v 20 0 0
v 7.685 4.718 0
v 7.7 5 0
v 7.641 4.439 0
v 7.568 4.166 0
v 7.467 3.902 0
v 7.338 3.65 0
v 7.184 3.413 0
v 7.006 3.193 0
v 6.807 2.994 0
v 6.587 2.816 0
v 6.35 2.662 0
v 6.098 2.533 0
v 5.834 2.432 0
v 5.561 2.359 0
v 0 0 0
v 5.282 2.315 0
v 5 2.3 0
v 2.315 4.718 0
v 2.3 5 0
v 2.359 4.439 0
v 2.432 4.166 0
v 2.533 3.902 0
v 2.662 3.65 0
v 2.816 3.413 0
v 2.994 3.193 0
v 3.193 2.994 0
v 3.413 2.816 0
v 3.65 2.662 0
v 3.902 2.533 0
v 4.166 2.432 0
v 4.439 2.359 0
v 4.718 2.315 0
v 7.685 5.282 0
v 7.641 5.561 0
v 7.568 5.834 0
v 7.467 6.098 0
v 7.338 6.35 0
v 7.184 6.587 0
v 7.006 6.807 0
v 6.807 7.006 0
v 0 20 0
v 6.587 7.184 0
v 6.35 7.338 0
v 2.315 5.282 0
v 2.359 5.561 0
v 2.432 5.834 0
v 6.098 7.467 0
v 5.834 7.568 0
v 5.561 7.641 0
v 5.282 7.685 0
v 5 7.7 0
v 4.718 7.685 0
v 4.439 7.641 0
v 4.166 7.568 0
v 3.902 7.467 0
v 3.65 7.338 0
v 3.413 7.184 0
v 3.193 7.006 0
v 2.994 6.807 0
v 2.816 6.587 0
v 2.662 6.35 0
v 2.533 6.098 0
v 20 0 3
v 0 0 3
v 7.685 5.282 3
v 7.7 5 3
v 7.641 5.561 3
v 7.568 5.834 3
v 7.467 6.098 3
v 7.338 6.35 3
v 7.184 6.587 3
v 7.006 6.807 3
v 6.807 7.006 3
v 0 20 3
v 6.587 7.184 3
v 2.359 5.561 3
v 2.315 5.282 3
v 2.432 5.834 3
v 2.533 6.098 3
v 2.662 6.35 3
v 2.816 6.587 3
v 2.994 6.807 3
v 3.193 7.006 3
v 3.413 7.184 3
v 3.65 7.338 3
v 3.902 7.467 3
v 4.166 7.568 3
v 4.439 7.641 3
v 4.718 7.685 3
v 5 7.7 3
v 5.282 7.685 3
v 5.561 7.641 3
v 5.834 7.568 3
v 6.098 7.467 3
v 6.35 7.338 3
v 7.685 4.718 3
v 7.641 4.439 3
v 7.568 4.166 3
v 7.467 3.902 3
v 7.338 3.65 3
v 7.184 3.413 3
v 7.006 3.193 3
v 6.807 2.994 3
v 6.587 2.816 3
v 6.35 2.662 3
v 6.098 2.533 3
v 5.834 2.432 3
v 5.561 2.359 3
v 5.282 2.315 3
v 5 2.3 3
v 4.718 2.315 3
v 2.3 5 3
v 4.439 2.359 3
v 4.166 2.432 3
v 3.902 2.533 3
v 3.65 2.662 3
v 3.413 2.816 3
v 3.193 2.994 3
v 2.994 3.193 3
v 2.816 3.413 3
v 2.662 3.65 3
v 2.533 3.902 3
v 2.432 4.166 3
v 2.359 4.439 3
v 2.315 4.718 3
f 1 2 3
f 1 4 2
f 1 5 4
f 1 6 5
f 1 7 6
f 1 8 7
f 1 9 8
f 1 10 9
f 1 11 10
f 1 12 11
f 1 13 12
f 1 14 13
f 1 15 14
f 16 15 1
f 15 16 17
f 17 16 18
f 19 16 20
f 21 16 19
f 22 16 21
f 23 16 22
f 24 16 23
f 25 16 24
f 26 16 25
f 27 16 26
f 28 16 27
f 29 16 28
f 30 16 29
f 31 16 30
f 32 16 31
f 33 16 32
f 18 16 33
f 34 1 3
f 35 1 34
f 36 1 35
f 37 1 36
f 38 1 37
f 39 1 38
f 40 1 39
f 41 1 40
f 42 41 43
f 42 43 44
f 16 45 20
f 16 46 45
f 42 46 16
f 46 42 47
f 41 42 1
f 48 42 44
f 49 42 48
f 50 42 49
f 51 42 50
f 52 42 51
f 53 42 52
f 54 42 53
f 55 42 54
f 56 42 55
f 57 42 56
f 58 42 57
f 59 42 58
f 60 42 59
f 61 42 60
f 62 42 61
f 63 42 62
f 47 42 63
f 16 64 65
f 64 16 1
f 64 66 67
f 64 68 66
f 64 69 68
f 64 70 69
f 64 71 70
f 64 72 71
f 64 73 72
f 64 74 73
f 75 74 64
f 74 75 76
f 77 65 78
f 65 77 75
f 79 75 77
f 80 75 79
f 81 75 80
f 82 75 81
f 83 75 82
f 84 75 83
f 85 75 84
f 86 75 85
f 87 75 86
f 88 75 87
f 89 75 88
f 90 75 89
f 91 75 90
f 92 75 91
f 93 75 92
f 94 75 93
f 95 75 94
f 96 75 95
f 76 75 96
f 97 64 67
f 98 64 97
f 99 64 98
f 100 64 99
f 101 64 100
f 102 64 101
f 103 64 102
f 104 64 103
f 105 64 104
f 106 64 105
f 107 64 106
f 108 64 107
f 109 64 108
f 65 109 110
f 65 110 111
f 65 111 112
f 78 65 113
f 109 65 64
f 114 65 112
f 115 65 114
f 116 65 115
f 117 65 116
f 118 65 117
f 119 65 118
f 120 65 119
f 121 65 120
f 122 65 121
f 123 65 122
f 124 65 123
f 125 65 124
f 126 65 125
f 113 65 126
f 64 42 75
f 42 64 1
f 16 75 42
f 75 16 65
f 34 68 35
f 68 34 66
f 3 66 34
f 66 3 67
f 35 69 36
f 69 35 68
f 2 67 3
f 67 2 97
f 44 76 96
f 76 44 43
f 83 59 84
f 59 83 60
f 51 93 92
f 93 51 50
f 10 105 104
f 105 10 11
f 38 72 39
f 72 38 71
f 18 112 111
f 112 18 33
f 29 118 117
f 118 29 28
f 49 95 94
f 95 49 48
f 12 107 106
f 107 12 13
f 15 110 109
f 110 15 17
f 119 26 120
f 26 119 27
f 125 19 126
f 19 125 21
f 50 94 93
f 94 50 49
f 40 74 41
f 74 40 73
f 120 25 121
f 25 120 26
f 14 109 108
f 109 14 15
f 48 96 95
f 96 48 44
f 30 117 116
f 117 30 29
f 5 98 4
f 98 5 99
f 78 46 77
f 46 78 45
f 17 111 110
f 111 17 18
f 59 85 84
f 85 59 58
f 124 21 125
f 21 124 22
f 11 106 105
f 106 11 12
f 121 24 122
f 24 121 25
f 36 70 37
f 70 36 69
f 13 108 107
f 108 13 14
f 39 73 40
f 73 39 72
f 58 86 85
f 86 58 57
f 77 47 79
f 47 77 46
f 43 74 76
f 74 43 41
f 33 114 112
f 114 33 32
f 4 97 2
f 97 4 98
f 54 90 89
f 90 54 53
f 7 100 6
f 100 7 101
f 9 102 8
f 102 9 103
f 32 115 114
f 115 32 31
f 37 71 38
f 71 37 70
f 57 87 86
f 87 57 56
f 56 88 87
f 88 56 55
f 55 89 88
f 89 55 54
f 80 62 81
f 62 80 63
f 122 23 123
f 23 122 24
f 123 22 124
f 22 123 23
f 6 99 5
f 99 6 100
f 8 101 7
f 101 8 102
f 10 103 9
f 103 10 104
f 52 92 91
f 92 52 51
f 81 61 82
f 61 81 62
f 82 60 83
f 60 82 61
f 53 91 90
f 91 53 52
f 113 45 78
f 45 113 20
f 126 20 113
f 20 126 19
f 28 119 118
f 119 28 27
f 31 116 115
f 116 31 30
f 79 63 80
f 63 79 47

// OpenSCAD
// Triangular reinforcement gusset.
$fn = 60;
eps = 0.02;
leg = 20;
thickness = 3;
difference() {
    linear_extrude(height=thickness) polygon(points=[[0,0],[leg,0],[0,leg]]);
    translate([leg*0.25,leg*0.25,-eps]) cylinder(d=5.4,h=thickness+2*eps);
}
